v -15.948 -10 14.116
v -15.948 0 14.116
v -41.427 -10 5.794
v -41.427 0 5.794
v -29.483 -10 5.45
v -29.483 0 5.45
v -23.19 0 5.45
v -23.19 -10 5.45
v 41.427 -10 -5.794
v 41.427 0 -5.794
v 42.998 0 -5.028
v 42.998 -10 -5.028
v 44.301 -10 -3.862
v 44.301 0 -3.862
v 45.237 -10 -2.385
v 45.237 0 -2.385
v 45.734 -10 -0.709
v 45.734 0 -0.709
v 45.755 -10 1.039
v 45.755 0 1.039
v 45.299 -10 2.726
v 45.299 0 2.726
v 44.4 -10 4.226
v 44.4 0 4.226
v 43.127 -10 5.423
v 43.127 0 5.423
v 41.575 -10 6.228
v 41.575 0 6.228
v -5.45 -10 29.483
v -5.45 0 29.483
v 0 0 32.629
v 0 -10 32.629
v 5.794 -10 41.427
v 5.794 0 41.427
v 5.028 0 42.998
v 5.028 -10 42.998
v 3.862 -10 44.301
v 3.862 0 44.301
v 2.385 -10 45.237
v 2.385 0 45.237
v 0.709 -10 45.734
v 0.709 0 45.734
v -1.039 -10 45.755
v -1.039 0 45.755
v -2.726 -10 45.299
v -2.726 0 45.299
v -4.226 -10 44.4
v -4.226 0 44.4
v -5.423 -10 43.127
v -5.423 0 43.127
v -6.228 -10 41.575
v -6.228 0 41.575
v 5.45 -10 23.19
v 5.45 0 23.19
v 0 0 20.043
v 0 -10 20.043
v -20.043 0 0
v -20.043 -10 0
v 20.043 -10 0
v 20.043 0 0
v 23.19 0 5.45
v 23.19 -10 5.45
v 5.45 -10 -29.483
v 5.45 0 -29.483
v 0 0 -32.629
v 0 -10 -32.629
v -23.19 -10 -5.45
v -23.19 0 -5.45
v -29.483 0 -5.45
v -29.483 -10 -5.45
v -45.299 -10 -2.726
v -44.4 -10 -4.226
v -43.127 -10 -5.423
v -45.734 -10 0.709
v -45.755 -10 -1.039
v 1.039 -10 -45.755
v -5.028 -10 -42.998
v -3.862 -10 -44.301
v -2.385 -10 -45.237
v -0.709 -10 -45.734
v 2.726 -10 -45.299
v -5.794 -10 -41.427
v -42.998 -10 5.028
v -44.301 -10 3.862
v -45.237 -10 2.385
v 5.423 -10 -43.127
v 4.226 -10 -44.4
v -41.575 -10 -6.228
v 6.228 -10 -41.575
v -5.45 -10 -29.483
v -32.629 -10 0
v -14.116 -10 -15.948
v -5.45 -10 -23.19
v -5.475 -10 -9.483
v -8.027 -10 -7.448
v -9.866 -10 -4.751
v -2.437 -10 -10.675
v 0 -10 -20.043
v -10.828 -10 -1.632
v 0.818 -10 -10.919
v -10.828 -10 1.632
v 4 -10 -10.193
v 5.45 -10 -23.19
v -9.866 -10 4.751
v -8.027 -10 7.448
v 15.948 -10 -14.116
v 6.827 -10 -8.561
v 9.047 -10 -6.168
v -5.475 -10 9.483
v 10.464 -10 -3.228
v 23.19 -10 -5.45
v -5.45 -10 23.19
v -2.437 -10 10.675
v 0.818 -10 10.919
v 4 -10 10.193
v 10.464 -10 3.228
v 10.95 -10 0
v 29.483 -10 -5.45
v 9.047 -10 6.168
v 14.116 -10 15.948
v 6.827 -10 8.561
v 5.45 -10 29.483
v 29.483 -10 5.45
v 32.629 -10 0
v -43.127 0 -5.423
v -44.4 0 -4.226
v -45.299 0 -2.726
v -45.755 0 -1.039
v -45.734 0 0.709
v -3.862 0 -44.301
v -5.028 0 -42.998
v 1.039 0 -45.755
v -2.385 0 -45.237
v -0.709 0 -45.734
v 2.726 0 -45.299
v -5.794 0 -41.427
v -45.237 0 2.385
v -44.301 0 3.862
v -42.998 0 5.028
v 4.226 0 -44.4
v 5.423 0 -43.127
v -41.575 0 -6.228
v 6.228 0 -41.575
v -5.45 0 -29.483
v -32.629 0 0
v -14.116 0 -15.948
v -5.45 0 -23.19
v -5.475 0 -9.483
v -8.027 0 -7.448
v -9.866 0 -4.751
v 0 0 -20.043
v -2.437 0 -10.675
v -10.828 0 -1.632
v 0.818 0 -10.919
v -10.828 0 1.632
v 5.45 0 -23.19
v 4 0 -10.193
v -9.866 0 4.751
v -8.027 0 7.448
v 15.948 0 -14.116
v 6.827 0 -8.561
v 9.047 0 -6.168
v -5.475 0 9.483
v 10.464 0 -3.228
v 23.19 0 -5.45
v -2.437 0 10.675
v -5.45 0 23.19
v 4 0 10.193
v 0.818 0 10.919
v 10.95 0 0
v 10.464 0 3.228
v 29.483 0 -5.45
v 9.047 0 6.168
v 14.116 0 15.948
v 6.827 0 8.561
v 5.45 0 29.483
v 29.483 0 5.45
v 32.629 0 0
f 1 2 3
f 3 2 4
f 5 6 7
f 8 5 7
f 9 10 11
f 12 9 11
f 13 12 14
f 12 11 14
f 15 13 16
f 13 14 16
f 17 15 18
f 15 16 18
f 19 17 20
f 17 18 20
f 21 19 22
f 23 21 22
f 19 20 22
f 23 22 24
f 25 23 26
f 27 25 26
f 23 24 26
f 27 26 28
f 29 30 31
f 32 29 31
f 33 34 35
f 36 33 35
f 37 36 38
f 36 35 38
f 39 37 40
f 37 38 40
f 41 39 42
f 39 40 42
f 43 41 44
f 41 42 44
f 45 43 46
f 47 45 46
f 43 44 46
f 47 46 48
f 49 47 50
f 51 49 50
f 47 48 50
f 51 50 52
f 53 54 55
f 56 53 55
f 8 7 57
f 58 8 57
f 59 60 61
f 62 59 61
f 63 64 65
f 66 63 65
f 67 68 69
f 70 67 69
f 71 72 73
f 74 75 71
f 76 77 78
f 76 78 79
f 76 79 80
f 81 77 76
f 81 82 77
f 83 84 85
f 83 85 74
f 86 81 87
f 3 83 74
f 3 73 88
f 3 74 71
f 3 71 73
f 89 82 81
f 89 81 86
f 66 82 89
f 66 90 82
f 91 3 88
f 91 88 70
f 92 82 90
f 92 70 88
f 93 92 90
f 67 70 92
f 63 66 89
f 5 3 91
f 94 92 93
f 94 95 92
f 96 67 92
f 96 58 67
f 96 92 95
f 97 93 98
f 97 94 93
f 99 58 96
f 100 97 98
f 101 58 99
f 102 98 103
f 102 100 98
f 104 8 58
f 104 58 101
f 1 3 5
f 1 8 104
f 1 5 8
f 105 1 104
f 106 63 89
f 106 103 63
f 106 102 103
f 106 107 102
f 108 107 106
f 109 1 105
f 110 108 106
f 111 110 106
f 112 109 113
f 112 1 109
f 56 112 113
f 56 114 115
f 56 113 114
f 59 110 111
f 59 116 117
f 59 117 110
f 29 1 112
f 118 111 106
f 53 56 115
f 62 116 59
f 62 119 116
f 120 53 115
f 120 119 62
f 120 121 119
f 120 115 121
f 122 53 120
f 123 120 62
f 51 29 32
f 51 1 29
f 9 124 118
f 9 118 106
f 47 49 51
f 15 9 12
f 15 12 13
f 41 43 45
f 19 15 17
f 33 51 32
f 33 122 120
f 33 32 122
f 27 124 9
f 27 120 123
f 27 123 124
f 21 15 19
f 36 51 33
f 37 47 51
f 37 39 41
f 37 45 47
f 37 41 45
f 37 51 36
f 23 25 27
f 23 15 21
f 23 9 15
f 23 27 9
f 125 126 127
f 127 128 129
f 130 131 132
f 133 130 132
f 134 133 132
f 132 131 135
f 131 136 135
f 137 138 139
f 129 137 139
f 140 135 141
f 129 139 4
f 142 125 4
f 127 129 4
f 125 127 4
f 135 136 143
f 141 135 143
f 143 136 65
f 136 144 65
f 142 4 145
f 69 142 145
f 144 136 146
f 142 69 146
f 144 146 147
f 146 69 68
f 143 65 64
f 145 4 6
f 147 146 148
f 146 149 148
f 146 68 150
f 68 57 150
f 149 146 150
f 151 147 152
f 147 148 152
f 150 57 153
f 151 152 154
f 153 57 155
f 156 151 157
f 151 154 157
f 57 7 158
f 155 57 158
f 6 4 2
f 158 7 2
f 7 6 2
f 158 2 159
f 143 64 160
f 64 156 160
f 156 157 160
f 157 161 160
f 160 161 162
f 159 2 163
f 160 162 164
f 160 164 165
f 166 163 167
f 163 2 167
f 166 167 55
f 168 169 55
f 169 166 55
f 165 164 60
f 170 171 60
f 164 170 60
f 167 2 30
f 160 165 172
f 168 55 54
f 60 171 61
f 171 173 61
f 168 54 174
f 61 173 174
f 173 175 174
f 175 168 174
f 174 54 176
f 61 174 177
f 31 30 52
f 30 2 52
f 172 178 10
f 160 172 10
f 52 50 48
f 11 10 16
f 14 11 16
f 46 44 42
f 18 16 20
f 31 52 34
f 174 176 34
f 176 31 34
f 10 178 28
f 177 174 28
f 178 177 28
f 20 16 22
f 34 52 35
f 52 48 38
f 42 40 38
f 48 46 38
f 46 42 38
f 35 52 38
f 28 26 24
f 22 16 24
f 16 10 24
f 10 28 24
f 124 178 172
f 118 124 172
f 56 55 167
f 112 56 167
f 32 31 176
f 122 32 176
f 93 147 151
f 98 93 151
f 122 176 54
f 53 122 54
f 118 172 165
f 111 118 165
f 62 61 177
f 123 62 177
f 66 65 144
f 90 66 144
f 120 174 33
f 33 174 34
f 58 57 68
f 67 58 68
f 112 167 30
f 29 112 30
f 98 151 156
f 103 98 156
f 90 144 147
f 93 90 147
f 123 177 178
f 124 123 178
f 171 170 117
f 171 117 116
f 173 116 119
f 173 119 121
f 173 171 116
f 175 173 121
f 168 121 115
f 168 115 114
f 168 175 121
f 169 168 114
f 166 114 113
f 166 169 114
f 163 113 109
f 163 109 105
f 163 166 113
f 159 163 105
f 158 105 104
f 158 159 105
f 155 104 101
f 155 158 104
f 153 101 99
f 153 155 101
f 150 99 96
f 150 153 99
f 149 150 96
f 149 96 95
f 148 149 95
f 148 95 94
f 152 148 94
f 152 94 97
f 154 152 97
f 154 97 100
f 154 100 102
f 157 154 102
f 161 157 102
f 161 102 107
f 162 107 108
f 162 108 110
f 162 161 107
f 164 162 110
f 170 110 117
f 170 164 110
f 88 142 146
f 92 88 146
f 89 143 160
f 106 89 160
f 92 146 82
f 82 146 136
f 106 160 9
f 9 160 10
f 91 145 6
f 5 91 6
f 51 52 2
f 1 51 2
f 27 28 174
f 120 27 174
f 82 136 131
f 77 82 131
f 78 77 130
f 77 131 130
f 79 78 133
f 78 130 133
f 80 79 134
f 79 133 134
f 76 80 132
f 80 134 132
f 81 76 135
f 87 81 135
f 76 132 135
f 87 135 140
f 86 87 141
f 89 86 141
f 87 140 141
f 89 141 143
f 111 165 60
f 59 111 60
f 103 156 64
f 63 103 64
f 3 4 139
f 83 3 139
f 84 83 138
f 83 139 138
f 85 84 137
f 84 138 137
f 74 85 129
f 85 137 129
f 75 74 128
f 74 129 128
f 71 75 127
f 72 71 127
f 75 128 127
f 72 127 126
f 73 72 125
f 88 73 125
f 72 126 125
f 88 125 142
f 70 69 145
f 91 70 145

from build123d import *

# Parameters (mm, degrees)
F0_R     = 10.95
F1_DEPTH = 10


with BuildPart() as f1:
    # F0 (on Front) → F1 (new body)
    with BuildSketch(Plane.XZ):
        with BuildLine():
            Line((-6.227786, 41.574522), (-15.947611, 14.116478))
            Line((-15.947611, 14.116478), (-41.427071, 5.794421))
            ThreePointArc((-41.427071, 5.794421), (-45.805064, -0.163891), (-41.574522, -6.227786))
            Line((-41.574522, -6.227786), (-14.116478, -15.947611))
            Line((-14.116478, -15.947611), (-5.794421, -41.427071))
            ThreePointArc((-5.794421, -41.427071), (0.163891, -45.805064), (6.227786, -41.574522))
            Line((6.227786, -41.574522), (15.947611, -14.116478))
            Line((15.947611, -14.116478), (41.427071, -5.794421))
            ThreePointArc((41.427071, -5.794421), (45.805064, 0.163891), (41.574522, 6.227786))
            Line((41.574522, 6.227786), (14.116478, 15.947611))
            Line((14.116478, 15.947611), (5.794421, 41.427071))
            ThreePointArc((5.794421, 41.427071), (-0.163891, 45.805064), (-6.227786, 41.574522))
        make_face()
        Polygon((-5.45, -23.189698), (0, -20.043139), (5.45, -23.189698), (5.45, -29.482816), (0, -32.629375), (-5.45, -29.482816), align=None, mode=Mode.SUBTRACT)
        Polygon((-23.189698, 5.45), (-20.043139, 0), (-23.189698, -5.45), (-29.482816, -5.45), (-32.629375, 0), (-29.482816, 5.45), align=None, mode=Mode.SUBTRACT)
        Circle(F0_R, mode=Mode.SUBTRACT)
        Polygon((0, 32.629375), (5.45, 29.482816), (5.45, 23.189698), (0, 20.043139), (-5.45, 23.189698), (-5.45, 29.482816), align=None, mode=Mode.SUBTRACT)
        Polygon((23.189698, -5.45), (20.043139, 0), (23.189698, 5.45), (29.482816, 5.45), (32.629375, 0), (29.482816, -5.45), align=None, mode=Mode.SUBTRACT)
    extrude(amount=F1_DEPTH)


solid = f1.part
